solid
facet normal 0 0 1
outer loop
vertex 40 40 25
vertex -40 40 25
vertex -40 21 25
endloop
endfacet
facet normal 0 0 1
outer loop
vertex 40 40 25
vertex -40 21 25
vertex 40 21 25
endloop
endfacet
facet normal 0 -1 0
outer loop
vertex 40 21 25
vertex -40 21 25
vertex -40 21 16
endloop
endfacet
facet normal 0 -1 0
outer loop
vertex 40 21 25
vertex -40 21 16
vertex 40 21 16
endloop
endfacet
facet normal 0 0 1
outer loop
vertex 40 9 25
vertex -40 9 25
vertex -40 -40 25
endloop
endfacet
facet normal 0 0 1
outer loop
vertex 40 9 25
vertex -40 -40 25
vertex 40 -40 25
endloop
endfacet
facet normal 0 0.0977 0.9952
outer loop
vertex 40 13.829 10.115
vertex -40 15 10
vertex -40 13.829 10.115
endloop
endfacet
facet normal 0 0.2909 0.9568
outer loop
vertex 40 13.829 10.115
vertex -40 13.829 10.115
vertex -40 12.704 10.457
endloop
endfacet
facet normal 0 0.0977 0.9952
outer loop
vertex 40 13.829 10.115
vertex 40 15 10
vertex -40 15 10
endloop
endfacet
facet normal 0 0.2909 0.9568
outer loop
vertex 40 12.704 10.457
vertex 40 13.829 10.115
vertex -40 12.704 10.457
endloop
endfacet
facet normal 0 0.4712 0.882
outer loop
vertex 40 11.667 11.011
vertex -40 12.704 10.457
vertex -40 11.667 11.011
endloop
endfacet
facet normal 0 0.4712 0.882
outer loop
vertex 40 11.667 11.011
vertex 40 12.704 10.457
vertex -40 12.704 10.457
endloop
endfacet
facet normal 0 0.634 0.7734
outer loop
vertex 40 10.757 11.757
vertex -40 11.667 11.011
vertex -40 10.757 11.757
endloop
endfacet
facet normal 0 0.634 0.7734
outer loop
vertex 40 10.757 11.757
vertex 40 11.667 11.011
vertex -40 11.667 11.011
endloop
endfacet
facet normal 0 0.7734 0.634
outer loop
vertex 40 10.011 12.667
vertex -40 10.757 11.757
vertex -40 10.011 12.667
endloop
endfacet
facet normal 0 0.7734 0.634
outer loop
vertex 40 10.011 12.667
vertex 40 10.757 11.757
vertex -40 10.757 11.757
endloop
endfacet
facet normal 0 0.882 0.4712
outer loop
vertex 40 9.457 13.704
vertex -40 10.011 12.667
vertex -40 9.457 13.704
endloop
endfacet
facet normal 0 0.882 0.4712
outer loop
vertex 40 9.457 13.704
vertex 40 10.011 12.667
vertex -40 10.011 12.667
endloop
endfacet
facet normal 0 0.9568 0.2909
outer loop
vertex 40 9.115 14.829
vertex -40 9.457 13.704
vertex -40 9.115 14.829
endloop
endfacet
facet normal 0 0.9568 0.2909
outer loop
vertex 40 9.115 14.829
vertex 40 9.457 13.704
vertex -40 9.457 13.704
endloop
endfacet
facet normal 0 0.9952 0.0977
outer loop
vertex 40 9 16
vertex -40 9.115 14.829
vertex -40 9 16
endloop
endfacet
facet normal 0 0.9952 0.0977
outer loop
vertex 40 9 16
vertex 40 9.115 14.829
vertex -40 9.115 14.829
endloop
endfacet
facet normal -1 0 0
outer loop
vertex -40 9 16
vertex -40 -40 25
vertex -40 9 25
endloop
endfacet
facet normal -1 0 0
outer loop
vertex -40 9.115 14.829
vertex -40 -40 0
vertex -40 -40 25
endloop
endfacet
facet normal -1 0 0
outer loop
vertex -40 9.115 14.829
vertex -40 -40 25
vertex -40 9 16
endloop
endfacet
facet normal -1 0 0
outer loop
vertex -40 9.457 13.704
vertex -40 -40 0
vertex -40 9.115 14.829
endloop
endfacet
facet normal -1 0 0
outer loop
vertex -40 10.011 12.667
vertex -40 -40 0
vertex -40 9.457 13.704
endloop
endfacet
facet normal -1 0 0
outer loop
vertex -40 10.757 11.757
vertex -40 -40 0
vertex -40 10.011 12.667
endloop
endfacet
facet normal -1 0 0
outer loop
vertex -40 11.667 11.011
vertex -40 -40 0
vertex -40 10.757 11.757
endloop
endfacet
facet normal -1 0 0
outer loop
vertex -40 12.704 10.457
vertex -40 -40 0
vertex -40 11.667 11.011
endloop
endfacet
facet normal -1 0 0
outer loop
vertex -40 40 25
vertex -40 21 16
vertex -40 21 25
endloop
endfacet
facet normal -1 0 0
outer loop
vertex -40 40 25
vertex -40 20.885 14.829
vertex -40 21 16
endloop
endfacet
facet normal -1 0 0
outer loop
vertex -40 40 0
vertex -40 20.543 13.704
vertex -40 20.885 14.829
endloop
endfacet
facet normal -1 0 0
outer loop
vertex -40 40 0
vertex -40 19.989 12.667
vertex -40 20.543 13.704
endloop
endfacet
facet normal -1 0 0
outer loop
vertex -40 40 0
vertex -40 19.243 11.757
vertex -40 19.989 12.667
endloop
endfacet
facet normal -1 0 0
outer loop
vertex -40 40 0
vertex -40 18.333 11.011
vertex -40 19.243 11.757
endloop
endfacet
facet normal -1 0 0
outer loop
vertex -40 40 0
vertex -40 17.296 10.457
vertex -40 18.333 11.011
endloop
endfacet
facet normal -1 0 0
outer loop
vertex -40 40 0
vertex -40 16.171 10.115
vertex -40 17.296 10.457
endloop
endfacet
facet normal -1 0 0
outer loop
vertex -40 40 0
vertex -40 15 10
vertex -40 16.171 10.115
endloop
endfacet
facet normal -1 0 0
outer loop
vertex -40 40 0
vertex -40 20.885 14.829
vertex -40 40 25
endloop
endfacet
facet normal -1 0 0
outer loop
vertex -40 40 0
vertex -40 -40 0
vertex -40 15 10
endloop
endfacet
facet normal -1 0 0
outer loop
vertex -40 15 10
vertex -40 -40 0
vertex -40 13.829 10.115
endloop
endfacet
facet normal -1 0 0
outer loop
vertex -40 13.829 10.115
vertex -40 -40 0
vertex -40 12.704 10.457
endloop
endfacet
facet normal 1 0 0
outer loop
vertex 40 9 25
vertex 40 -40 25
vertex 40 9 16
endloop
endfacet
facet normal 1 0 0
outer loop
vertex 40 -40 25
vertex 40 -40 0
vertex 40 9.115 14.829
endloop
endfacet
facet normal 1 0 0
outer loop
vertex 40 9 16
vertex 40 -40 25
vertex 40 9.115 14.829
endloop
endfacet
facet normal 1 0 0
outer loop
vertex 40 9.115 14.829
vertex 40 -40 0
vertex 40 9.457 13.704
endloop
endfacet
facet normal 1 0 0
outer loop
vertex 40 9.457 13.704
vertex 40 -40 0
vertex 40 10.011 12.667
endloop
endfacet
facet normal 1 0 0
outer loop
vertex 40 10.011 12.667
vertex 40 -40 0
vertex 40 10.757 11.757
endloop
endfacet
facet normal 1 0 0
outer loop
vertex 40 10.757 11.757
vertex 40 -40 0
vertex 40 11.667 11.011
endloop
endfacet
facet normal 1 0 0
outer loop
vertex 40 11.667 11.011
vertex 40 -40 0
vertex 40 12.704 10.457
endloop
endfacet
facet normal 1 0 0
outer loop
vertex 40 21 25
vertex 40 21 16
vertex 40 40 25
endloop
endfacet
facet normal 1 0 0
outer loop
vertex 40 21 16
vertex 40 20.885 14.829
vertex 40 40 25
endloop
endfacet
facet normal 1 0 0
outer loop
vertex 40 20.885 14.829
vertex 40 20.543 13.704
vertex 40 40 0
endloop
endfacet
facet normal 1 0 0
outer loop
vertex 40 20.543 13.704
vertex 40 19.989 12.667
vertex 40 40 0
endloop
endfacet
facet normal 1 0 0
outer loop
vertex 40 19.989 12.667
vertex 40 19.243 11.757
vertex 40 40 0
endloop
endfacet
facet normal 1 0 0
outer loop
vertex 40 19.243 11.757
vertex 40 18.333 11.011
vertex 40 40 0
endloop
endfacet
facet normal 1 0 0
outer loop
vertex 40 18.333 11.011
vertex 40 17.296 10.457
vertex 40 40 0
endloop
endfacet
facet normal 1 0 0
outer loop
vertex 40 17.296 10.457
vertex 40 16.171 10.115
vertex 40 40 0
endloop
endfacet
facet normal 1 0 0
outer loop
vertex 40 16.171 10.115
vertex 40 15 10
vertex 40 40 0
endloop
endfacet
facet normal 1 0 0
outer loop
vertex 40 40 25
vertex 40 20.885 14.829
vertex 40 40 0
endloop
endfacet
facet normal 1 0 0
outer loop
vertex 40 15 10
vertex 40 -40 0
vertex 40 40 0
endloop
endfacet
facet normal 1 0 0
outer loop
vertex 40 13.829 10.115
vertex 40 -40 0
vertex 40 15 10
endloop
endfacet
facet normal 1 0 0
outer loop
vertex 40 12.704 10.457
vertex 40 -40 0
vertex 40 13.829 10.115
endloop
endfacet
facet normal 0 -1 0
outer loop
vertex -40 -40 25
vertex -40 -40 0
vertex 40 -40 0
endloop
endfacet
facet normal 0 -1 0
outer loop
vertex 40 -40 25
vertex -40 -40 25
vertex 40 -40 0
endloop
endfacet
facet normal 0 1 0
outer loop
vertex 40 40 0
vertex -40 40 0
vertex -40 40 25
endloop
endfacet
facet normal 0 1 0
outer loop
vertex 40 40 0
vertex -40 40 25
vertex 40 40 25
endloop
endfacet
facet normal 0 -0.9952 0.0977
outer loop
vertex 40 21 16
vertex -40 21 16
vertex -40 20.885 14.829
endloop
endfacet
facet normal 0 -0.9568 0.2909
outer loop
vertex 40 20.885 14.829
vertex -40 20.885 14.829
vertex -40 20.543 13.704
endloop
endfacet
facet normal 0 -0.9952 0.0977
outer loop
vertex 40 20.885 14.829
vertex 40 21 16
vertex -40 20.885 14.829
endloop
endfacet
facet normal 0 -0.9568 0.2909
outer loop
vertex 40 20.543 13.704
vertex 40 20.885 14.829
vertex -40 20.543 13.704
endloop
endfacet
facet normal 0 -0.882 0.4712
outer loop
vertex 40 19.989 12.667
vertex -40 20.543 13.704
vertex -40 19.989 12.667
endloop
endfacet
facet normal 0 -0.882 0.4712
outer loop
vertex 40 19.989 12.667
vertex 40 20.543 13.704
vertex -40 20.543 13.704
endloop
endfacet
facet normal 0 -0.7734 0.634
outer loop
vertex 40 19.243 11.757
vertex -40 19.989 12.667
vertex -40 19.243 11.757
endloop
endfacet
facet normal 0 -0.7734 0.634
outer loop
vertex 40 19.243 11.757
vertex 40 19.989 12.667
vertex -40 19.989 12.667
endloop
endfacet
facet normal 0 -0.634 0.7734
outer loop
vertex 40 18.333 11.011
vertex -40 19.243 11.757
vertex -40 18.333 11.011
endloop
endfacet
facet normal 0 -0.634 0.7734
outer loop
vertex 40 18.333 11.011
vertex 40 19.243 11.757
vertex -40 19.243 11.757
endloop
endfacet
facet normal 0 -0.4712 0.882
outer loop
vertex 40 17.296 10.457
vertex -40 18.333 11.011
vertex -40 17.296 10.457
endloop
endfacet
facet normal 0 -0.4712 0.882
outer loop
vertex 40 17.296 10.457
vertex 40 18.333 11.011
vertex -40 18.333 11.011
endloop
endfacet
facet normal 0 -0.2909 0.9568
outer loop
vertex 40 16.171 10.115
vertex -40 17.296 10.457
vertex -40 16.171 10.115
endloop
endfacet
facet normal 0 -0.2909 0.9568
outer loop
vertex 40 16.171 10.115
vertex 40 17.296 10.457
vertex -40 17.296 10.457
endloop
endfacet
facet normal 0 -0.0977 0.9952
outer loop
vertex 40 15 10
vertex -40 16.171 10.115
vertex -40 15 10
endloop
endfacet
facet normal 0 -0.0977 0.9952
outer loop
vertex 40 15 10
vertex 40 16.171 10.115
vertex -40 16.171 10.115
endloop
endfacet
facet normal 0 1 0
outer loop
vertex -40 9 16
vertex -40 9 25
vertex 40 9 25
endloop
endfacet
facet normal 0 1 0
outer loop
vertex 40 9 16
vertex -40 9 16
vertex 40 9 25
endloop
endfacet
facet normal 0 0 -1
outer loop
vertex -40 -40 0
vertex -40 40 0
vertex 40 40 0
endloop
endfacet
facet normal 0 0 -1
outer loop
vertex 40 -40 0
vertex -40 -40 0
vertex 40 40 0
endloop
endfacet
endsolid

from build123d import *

# Parameters (mm, degrees)
F0_W     = 80
F0_H     = 80
F1_DEPTH = 25
F2_W     = 80
F2_H     = 12
F3_DEPTH = 15
F4_R     = 5.99999


# Not quite as in the source:
# - a fillet or chamfer is up to 0.001 mm smaller than in the source, because OpenCascade refuses the exact size


with BuildPart() as f1:
    # F0 (on Top) → F1 (new body)
    with BuildSketch(Plane.XY):
        Rectangle(F0_W, F0_H)
    extrude(amount=F1_DEPTH)

    # F2 (on face) → F3 (cut)
    with BuildSketch(Plane.XY.offset(25)):
        with Locations((0, 15)):
            Rectangle(F2_W, F2_H)
    extrude(amount=-F3_DEPTH, mode=Mode.SUBTRACT)

    # F4 (radius 6 in the source; OpenCascade refuses exactly that, so slightly less here)
    f4_edges = [f1.edges().sort_by_distance(p)[0] for p in [
        (0, 9, 10),
        (0, 21, 10),
    ]]
    fillet(f4_edges, radius=F4_R)


solid = f1.part
